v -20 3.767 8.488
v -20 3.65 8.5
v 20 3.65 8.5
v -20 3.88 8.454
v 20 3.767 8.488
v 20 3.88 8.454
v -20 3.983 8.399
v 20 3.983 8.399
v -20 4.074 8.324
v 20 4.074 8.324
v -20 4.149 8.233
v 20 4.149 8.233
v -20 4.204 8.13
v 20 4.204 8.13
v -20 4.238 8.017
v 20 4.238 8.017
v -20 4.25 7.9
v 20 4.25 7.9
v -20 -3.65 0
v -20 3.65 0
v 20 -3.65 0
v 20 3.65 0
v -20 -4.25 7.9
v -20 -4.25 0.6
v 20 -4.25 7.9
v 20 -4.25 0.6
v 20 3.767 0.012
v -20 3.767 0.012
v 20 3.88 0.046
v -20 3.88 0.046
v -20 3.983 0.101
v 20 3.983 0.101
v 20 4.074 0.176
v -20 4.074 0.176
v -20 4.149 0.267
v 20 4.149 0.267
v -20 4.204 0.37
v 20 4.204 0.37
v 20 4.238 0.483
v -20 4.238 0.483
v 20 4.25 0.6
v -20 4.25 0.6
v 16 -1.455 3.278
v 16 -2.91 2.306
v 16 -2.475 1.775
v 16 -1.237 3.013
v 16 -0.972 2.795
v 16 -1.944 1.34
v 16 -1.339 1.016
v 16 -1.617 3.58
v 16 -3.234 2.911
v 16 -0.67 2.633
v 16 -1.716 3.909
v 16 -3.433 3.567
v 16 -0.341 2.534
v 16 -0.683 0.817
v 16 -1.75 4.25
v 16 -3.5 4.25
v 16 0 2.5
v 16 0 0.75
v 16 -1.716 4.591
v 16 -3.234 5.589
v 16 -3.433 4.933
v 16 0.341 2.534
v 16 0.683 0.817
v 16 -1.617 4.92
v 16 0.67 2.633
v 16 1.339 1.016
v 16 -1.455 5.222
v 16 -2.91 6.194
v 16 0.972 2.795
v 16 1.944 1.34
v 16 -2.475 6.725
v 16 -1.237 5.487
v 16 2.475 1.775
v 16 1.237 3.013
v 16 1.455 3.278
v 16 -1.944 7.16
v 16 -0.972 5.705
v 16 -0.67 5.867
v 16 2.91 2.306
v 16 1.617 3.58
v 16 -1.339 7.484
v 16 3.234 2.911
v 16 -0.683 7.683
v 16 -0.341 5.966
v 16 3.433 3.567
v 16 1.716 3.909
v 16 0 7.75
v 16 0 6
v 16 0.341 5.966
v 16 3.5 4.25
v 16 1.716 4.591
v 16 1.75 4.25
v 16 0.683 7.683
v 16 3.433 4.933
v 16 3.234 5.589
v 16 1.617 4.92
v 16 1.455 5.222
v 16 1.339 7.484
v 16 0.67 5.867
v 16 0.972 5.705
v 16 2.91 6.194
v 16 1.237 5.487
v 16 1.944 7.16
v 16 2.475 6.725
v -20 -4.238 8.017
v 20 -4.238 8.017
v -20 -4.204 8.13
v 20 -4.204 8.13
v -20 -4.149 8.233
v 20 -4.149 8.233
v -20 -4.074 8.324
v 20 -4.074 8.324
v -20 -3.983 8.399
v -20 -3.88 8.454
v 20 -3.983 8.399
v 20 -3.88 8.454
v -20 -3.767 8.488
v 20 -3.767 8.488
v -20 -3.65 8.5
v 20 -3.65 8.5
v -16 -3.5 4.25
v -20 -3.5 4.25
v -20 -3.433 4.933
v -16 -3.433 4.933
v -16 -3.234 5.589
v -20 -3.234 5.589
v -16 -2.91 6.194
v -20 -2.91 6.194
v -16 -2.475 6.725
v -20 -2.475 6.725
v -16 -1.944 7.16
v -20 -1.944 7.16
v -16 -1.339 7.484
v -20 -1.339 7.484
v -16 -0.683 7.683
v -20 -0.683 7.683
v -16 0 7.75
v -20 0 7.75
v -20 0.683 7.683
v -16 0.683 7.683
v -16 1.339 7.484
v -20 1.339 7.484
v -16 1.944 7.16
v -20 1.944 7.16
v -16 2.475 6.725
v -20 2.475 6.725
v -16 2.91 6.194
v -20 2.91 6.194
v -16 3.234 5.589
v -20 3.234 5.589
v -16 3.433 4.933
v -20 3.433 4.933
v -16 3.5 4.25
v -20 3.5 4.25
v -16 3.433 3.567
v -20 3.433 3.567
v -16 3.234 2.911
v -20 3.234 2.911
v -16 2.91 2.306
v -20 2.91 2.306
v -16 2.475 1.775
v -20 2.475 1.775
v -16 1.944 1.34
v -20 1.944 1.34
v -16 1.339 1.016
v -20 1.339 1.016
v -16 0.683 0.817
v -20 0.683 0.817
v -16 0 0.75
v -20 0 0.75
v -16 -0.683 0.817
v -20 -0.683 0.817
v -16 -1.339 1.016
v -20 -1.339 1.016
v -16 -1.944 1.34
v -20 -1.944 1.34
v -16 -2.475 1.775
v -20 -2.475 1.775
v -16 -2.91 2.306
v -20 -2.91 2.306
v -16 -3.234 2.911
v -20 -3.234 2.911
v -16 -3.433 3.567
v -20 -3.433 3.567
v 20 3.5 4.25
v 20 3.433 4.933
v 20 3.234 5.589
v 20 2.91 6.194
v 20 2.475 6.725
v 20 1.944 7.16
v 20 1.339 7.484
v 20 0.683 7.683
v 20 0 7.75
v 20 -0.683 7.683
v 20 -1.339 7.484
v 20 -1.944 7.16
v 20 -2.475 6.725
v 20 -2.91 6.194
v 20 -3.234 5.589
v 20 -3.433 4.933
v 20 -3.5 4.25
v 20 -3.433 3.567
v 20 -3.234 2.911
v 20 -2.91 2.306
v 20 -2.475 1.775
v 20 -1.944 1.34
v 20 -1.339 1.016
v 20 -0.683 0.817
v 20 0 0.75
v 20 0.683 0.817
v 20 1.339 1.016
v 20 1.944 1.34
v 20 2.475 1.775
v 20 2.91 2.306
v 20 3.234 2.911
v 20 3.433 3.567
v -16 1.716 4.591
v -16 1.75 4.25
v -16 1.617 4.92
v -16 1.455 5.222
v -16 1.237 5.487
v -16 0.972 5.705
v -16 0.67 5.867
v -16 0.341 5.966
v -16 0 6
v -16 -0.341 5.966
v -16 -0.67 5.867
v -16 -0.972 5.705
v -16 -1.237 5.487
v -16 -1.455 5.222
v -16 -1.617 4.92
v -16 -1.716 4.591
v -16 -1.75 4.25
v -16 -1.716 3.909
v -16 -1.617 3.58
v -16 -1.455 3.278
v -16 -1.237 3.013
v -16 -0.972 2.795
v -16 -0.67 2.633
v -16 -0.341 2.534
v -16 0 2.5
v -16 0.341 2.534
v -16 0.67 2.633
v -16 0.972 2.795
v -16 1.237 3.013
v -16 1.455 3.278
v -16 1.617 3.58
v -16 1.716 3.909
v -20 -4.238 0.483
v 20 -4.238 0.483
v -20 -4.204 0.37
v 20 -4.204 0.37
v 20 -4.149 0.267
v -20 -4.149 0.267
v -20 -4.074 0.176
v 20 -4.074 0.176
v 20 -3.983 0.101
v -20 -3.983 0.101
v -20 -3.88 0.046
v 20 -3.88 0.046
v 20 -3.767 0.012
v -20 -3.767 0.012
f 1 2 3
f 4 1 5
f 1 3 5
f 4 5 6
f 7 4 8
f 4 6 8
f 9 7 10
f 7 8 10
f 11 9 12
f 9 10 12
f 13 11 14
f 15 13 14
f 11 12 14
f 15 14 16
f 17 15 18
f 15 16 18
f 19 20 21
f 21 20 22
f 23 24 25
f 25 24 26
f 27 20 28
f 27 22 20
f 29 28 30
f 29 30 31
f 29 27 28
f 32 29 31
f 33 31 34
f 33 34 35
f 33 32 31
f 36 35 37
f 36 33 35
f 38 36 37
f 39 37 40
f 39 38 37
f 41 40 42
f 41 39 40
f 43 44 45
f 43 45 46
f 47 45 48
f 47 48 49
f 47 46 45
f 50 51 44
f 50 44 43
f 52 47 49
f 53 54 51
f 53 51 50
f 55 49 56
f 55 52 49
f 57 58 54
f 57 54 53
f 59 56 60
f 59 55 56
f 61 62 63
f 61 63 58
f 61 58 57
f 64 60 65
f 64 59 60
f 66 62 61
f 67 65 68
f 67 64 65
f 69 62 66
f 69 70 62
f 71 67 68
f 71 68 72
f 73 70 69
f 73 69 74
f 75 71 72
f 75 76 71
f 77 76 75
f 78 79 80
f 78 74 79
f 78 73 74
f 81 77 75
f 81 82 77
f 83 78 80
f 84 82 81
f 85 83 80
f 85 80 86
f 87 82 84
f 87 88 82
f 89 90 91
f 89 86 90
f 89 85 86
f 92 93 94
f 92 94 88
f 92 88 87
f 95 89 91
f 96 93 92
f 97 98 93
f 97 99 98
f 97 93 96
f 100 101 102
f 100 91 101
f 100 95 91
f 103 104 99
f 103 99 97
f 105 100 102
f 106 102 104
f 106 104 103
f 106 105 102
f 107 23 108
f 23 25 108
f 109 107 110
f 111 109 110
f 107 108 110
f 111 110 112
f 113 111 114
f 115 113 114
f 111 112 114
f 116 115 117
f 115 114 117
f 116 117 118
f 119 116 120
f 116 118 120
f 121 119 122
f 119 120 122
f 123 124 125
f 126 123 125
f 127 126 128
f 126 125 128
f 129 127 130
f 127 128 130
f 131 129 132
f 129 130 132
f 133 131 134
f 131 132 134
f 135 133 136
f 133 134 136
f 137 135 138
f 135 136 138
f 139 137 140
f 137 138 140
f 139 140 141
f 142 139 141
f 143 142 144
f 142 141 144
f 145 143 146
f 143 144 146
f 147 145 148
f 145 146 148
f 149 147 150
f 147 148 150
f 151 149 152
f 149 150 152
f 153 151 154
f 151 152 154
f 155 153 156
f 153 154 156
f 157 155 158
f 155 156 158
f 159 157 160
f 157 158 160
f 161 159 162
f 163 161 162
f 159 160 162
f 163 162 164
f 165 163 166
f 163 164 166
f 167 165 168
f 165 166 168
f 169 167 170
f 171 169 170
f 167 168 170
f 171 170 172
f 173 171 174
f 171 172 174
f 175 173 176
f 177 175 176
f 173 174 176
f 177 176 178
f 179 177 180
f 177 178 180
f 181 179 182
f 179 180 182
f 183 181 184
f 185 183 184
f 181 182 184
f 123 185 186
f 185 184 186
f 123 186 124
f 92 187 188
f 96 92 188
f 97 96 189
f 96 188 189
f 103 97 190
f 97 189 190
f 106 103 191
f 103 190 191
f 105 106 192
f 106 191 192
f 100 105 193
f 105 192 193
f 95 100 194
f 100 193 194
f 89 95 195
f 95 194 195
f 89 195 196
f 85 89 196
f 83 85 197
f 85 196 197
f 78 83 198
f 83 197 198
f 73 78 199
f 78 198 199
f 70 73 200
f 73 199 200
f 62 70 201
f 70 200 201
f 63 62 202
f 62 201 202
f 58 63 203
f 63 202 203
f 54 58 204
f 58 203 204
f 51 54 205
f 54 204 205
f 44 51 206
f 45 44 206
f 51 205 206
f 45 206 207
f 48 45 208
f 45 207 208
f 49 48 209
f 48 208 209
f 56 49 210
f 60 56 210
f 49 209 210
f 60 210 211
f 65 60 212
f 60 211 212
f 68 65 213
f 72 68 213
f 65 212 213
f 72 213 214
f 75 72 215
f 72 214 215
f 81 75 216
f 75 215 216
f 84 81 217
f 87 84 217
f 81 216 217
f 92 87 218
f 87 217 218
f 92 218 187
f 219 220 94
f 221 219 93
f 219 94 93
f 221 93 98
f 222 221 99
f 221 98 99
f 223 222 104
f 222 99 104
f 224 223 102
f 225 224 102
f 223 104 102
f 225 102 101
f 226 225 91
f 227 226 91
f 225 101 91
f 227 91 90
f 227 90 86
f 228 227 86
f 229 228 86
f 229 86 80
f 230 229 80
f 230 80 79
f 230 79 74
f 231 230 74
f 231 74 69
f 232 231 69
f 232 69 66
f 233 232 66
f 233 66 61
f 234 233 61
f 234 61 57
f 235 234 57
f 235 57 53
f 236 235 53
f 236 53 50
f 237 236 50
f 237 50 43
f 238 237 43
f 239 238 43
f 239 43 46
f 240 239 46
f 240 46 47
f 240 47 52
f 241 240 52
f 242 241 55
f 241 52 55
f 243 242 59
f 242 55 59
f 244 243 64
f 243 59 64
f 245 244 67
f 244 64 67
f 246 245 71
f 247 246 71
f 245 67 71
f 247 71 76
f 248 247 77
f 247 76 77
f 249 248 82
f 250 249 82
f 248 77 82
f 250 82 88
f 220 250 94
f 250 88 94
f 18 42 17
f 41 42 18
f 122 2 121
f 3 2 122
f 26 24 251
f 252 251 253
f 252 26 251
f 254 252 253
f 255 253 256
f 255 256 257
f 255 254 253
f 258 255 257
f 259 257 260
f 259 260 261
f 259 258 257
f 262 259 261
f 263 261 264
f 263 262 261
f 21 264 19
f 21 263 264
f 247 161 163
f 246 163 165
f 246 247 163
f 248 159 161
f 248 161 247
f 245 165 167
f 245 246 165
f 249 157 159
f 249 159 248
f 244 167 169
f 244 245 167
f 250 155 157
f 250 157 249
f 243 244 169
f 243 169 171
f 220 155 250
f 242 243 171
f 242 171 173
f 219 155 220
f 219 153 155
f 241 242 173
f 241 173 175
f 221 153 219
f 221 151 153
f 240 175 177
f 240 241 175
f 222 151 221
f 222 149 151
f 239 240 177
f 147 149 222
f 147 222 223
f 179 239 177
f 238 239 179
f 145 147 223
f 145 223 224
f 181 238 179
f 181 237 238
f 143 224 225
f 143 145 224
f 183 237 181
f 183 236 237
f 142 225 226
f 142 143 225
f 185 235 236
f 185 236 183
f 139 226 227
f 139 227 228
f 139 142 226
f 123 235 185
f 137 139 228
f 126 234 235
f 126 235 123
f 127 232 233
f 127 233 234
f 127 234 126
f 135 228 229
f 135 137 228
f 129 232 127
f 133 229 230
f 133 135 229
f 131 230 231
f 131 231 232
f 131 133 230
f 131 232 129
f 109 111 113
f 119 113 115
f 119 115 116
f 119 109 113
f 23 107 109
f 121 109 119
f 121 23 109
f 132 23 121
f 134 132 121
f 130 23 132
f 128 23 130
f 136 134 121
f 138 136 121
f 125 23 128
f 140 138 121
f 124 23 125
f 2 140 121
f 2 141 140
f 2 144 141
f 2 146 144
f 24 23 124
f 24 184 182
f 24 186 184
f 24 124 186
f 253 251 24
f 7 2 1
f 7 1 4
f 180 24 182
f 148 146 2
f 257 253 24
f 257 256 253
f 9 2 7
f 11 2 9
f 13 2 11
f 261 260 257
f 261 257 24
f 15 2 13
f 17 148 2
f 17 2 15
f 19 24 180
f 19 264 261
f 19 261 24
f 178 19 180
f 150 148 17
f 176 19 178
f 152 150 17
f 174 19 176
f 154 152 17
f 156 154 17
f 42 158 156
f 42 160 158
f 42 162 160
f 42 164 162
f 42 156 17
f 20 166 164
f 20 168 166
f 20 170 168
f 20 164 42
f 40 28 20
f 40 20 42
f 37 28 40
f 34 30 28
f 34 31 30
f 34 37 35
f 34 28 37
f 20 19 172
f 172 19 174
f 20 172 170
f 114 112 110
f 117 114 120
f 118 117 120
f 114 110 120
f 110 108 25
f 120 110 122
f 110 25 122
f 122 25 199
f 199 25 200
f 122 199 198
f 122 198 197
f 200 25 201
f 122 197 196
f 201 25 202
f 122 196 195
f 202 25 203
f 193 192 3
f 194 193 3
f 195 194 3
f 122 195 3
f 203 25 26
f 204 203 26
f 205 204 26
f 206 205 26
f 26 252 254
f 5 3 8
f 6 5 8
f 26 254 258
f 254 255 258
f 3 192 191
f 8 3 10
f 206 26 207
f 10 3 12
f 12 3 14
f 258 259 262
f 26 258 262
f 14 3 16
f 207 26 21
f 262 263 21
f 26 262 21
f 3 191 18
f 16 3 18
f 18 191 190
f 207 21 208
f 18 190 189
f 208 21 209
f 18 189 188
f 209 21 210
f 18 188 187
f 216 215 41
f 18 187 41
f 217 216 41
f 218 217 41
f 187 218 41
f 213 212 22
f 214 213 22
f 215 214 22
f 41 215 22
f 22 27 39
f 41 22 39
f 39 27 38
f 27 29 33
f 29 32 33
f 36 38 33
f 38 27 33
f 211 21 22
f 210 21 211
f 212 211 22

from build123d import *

# Parameters (mm, degrees)
F0_W     = 40
F0_H     = 8.5
F1_DEPTH = 8.5
F2_R     = 1.75
F3_DEPTH = 40
F2_R_2   = 3.5
F4_DEPTH = 4
F5_R     = 3.5
F6_DEPTH = 4
F7_R     = 0.6


with BuildPart() as f1:
    # F0 (on Top) → F1 (new body)
    with BuildSketch(Plane.XY):
        Rectangle(F0_W, F0_H)
    extrude(amount=F1_DEPTH)

    # F2 (on face) → F3 (cut)
    with BuildSketch(Plane.YZ.offset(20)):
        with Locations((0, 4.25)):
            Circle(F2_R)
    extrude(amount=-F3_DEPTH, mode=Mode.SUBTRACT)

    # F2 (on face) → F4 (cut)
    with BuildSketch(Plane.YZ.offset(20)):
        with Locations((0, 4.25)):
            Circle(F2_R_2)
        with Locations((0, 4.25)):
            Circle(F2_R, mode=Mode.SUBTRACT)
    extrude(amount=-F4_DEPTH, mode=Mode.SUBTRACT)

    # F5 (on face) → F6 (cut)
    with BuildSketch(Plane(origin=(-20, 0, 0), x_dir=(0, -1, 0), z_dir=(-1, 0, 0))):
        with Locations((0, 4.25)):
            Circle(F5_R)
    extrude(amount=-F6_DEPTH, mode=Mode.SUBTRACT)

    # F7
    f7_edges = [f1.edges().sort_by_distance(p)[0] for p in [
        (0, 4.25, 8.5),
        (0, 4.25, 0),
        (0, -4.25, 8.5),
        (0, -4.25, 0),
    ]]
    fillet(f7_edges, radius=F7_R)


solid = f1.part
